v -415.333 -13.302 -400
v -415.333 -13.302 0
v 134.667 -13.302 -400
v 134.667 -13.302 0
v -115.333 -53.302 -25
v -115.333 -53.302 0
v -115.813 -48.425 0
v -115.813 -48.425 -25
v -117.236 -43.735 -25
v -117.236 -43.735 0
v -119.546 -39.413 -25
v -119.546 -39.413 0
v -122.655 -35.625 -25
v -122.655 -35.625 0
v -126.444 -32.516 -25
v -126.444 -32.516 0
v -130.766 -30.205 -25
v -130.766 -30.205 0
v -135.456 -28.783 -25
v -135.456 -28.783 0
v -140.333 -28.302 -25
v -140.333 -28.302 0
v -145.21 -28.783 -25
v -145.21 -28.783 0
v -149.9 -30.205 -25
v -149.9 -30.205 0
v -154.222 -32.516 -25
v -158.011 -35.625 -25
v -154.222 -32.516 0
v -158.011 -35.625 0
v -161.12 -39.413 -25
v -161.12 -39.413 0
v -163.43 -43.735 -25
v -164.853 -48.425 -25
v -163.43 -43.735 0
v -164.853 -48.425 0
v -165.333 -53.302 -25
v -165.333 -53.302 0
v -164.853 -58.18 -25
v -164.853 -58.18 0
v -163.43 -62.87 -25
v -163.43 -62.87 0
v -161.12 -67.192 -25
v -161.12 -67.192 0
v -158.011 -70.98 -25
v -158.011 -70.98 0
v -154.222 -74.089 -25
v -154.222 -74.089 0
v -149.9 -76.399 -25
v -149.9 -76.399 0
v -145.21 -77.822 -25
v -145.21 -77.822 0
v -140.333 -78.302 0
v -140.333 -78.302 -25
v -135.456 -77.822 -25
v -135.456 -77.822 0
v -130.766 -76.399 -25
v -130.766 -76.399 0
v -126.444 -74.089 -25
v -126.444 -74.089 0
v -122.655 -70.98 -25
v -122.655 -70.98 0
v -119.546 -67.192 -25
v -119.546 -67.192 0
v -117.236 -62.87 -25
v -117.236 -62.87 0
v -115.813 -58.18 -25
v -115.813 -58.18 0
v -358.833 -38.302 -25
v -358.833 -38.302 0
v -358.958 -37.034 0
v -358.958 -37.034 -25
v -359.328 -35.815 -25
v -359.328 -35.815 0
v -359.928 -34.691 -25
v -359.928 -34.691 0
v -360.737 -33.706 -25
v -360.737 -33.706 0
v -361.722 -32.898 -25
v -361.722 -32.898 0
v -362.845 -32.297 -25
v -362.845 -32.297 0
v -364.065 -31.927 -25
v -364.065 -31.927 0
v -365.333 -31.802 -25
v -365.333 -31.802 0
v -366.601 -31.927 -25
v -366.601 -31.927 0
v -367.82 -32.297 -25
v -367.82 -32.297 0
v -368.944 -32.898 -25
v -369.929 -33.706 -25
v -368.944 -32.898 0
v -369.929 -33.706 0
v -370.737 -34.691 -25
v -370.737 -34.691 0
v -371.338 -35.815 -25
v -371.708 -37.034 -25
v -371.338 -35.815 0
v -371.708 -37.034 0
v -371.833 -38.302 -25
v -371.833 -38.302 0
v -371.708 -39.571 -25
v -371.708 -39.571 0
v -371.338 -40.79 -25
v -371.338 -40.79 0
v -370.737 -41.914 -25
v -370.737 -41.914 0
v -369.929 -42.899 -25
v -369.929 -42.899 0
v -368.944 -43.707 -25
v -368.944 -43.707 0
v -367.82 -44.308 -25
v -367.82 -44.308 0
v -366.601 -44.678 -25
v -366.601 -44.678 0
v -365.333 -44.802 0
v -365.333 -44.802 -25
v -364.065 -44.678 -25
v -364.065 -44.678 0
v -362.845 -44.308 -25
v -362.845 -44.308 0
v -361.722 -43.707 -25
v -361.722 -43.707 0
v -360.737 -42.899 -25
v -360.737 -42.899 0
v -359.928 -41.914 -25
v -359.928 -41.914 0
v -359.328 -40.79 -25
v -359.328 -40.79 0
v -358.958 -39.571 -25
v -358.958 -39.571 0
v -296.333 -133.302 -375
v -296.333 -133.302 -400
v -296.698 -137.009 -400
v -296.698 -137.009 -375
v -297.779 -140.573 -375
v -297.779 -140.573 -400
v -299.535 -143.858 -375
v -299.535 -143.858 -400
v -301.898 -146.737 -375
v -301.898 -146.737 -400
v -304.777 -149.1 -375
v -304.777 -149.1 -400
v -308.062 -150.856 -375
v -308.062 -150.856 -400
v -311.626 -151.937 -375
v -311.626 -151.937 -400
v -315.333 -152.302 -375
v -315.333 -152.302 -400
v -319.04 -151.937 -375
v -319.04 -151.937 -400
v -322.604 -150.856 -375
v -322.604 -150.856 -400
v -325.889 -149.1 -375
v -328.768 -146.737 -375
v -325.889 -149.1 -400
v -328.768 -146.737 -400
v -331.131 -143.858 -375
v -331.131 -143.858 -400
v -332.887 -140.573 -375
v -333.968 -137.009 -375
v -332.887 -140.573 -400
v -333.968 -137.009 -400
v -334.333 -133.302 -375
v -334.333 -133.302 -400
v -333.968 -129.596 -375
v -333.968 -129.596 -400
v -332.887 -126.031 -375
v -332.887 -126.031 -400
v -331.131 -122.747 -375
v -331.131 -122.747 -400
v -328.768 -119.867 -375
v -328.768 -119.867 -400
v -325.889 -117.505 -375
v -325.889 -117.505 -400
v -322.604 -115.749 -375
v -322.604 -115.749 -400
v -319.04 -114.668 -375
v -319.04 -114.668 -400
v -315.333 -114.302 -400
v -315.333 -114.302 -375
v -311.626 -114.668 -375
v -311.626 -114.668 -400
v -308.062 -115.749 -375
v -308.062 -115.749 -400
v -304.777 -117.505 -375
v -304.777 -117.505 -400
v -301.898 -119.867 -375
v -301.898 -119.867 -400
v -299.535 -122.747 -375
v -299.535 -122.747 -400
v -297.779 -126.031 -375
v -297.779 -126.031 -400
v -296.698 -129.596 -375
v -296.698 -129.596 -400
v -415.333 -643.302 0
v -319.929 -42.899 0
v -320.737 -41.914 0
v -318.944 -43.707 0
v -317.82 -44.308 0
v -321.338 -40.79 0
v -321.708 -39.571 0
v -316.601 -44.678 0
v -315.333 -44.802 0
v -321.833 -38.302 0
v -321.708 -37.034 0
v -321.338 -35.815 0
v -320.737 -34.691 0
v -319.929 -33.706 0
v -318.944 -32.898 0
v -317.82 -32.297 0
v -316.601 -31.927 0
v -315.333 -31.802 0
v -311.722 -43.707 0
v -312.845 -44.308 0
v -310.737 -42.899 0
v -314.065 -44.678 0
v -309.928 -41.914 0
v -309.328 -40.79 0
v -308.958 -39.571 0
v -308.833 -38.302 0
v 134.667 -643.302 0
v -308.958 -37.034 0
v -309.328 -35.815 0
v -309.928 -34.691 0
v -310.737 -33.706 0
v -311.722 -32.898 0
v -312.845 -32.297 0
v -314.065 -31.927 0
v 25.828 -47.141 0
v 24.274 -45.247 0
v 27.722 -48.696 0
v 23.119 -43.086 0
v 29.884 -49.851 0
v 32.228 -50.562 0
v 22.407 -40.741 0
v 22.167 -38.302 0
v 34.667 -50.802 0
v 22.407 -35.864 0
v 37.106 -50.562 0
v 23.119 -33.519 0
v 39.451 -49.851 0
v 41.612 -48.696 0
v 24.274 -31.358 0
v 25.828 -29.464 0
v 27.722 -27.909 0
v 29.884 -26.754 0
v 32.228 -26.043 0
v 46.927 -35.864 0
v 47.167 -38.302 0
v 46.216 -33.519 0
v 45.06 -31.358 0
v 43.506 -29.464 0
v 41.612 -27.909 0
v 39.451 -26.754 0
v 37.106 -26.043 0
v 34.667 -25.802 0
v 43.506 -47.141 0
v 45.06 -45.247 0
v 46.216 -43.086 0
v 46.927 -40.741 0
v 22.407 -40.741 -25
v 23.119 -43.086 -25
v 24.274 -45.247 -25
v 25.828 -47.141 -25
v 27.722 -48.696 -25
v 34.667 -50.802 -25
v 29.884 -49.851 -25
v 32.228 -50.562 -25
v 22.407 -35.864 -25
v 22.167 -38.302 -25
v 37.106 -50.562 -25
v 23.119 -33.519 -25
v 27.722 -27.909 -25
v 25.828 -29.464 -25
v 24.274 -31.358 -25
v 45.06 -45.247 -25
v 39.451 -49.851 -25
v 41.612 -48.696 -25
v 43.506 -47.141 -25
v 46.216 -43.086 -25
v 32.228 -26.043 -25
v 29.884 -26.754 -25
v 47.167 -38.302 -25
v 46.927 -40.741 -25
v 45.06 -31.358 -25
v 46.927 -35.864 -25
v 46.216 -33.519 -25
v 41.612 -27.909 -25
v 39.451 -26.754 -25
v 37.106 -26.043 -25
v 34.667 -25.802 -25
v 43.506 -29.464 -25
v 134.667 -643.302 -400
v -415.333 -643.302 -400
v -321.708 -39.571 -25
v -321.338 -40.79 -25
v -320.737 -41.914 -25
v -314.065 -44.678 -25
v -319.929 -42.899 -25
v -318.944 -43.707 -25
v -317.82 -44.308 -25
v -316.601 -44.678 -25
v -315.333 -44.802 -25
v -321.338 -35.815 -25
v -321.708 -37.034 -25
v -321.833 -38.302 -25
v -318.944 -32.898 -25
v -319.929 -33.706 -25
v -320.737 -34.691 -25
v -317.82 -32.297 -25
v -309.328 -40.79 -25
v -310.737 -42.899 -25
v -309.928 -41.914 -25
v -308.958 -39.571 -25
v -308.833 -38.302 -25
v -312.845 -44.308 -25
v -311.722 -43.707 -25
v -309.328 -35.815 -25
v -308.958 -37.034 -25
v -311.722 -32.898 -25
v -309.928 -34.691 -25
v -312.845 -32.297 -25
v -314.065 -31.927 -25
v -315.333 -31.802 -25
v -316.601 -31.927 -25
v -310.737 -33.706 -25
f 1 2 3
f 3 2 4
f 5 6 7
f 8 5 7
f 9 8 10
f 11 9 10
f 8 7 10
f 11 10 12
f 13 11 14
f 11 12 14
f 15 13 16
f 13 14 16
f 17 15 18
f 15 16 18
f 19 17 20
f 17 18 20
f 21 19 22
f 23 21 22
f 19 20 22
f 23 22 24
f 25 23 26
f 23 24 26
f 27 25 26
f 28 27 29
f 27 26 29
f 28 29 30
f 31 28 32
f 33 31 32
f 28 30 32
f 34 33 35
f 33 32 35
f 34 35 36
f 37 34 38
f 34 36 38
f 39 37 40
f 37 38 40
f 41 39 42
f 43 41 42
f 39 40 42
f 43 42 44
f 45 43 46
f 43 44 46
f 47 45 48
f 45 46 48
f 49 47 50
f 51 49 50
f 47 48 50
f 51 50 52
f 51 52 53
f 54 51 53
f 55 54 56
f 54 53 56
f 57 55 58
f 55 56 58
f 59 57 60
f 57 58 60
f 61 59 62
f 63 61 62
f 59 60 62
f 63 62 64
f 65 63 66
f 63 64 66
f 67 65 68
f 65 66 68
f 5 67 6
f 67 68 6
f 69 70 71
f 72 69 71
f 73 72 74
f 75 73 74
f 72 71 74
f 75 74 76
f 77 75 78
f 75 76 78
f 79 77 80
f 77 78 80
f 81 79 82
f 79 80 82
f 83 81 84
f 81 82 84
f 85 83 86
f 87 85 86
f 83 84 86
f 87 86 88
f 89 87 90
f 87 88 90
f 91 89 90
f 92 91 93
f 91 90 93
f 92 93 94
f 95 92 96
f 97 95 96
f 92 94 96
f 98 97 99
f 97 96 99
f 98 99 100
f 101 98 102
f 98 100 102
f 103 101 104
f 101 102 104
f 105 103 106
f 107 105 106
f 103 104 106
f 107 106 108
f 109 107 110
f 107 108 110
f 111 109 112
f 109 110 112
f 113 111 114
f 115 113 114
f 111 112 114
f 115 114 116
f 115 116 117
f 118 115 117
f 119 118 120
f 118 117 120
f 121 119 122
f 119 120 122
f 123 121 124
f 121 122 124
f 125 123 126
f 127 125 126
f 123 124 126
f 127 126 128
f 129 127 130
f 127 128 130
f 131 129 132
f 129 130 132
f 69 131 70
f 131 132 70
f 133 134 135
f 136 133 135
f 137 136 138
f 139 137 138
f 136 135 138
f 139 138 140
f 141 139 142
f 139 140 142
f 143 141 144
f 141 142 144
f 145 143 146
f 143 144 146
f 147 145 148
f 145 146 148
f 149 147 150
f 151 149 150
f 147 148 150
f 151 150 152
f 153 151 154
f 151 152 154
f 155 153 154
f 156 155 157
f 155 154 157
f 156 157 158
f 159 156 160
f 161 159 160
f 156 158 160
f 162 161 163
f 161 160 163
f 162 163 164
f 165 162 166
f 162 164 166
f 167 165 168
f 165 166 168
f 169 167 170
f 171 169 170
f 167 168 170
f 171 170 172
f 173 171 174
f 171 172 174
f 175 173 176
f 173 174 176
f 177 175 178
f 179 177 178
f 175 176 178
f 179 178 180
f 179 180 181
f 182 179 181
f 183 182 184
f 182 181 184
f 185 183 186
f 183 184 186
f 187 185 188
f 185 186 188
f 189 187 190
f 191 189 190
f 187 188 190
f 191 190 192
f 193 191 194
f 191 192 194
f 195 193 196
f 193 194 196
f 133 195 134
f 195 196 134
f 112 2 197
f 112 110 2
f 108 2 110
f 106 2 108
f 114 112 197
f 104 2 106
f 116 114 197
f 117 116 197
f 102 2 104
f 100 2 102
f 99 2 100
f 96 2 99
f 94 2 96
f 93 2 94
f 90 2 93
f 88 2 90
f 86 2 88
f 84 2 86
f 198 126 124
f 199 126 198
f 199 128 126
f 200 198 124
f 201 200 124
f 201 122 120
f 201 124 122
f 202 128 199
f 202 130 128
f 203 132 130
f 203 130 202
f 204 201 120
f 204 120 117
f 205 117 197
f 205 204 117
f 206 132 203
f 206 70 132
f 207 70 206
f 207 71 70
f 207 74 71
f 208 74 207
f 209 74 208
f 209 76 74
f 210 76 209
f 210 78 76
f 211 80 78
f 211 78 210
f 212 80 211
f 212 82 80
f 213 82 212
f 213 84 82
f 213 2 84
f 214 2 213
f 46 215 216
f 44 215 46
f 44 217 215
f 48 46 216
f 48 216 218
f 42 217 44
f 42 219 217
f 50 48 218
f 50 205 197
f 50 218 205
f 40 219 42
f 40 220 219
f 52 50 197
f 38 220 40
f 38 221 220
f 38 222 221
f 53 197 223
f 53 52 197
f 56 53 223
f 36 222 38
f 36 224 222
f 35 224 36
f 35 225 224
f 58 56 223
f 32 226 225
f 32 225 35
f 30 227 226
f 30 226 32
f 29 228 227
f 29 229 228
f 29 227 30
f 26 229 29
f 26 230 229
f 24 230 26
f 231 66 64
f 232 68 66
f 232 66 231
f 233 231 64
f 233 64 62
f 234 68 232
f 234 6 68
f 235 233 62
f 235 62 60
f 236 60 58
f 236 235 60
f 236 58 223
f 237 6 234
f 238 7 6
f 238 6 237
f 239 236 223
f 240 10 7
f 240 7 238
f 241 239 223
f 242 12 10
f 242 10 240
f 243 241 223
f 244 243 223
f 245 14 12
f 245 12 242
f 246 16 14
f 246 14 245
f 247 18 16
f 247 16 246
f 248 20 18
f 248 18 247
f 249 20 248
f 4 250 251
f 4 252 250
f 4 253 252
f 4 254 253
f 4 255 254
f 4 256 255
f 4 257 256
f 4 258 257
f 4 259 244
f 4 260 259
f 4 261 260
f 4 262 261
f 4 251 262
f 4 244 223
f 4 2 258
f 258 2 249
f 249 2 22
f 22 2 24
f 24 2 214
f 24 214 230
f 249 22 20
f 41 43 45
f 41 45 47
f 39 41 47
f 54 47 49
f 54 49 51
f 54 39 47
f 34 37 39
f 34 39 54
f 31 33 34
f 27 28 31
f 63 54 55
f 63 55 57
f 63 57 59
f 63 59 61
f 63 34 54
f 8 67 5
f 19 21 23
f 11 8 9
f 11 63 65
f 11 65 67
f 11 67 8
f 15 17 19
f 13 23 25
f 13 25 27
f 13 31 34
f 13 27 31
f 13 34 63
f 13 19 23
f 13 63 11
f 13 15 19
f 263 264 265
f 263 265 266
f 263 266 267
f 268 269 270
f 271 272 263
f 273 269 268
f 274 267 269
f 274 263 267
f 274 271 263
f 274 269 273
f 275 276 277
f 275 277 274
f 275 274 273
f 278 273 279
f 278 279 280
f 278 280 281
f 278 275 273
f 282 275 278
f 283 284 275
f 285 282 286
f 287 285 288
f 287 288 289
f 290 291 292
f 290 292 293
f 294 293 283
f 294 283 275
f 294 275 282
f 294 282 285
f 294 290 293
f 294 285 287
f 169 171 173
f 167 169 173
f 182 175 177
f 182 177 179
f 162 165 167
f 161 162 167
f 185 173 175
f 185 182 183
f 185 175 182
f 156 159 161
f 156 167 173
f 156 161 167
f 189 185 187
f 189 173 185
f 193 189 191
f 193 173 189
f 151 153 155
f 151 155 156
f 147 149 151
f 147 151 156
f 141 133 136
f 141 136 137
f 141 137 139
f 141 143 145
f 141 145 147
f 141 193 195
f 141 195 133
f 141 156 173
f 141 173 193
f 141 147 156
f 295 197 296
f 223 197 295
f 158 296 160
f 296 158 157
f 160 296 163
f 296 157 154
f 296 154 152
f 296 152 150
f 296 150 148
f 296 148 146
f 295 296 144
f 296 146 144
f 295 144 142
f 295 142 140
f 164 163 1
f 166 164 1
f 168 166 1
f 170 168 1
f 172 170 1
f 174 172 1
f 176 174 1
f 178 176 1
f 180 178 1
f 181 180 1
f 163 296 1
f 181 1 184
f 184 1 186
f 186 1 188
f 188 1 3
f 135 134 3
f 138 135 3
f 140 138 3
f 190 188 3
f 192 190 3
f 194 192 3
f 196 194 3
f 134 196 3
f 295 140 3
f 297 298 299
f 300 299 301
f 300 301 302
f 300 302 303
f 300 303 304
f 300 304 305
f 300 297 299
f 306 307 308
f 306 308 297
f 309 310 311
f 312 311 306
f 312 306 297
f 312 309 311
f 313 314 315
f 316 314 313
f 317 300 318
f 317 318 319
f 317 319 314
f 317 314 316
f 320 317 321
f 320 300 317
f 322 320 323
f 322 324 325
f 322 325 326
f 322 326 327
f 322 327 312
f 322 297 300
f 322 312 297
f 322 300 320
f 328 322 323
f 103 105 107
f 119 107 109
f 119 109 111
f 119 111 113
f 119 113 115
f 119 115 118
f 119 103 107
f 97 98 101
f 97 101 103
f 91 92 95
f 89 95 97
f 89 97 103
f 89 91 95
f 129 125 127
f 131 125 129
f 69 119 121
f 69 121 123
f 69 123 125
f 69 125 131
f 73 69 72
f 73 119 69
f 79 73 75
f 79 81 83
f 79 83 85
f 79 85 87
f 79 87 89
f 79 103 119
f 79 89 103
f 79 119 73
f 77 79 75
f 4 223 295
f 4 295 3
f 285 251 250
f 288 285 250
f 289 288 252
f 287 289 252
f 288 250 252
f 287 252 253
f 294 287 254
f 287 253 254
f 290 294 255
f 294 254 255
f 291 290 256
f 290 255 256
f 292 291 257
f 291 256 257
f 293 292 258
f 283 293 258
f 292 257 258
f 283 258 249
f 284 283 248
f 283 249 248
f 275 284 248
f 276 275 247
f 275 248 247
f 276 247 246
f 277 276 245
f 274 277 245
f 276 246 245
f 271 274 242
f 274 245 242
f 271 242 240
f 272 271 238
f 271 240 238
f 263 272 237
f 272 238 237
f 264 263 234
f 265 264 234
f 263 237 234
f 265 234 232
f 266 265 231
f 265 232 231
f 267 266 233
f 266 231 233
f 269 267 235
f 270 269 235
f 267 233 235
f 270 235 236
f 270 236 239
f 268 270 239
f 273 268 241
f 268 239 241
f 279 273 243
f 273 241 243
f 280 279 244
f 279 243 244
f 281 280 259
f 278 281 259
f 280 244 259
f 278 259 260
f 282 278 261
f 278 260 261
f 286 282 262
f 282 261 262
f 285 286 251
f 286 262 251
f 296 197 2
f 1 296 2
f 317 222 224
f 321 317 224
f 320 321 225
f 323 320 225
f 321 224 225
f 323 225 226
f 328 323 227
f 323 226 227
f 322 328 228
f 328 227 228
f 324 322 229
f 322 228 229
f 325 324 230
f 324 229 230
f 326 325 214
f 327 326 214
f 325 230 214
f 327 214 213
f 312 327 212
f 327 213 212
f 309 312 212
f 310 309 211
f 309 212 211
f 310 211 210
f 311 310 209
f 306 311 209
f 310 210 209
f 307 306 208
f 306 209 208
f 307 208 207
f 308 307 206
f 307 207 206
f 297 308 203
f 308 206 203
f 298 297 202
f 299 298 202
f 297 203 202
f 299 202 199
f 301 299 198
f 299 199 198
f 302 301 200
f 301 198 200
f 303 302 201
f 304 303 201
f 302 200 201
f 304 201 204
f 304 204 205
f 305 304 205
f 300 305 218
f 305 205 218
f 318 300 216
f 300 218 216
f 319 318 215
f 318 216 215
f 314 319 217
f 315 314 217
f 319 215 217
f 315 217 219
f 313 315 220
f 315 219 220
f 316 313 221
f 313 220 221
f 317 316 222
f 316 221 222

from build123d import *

# Parameters (mm, degrees)
F0_W     = 550
F0_H     = 630
F1_DEPTH = 400
F2_R     = 19
F3_DEPTH = 25
F4_R     = 12.5
F4_R_2   = 6.5
F4_R_3   = 25
F5_DEPTH = 25


with BuildPart() as f1:
    # F0 (on Top) → F1 (new body)
    with BuildSketch(Plane.XY):
        with Locations((-140.332877, -328.302423)):
            Rectangle(F0_W, F0_H)
    extrude(amount=-F1_DEPTH)

    # F2 (on face) → F3 (cut)
    with BuildSketch(Plane(origin=(0, 0, -400), x_dir=(1, 0, 0), z_dir=(0, 0, -1))):
        with Locations((-315.332877, 133.302423)):
            Circle(F2_R)
    extrude(amount=-F3_DEPTH, mode=Mode.SUBTRACT)

    # F4 (on face) → F5 (cut)
    with BuildSketch(Plane.XY):
        with Locations((34.667123, -38.302423)):
            Circle(F4_R)
        with Locations((-365.332877, -38.302423)):
            Circle(F4_R_2)
        with Locations((-140.332877, -53.302423)):
            Circle(F4_R_3)
        with Locations((-315.332877, -38.302423)):
            Circle(F4_R_2)
    extrude(amount=-F5_DEPTH, mode=Mode.SUBTRACT)


solid = f1.part
